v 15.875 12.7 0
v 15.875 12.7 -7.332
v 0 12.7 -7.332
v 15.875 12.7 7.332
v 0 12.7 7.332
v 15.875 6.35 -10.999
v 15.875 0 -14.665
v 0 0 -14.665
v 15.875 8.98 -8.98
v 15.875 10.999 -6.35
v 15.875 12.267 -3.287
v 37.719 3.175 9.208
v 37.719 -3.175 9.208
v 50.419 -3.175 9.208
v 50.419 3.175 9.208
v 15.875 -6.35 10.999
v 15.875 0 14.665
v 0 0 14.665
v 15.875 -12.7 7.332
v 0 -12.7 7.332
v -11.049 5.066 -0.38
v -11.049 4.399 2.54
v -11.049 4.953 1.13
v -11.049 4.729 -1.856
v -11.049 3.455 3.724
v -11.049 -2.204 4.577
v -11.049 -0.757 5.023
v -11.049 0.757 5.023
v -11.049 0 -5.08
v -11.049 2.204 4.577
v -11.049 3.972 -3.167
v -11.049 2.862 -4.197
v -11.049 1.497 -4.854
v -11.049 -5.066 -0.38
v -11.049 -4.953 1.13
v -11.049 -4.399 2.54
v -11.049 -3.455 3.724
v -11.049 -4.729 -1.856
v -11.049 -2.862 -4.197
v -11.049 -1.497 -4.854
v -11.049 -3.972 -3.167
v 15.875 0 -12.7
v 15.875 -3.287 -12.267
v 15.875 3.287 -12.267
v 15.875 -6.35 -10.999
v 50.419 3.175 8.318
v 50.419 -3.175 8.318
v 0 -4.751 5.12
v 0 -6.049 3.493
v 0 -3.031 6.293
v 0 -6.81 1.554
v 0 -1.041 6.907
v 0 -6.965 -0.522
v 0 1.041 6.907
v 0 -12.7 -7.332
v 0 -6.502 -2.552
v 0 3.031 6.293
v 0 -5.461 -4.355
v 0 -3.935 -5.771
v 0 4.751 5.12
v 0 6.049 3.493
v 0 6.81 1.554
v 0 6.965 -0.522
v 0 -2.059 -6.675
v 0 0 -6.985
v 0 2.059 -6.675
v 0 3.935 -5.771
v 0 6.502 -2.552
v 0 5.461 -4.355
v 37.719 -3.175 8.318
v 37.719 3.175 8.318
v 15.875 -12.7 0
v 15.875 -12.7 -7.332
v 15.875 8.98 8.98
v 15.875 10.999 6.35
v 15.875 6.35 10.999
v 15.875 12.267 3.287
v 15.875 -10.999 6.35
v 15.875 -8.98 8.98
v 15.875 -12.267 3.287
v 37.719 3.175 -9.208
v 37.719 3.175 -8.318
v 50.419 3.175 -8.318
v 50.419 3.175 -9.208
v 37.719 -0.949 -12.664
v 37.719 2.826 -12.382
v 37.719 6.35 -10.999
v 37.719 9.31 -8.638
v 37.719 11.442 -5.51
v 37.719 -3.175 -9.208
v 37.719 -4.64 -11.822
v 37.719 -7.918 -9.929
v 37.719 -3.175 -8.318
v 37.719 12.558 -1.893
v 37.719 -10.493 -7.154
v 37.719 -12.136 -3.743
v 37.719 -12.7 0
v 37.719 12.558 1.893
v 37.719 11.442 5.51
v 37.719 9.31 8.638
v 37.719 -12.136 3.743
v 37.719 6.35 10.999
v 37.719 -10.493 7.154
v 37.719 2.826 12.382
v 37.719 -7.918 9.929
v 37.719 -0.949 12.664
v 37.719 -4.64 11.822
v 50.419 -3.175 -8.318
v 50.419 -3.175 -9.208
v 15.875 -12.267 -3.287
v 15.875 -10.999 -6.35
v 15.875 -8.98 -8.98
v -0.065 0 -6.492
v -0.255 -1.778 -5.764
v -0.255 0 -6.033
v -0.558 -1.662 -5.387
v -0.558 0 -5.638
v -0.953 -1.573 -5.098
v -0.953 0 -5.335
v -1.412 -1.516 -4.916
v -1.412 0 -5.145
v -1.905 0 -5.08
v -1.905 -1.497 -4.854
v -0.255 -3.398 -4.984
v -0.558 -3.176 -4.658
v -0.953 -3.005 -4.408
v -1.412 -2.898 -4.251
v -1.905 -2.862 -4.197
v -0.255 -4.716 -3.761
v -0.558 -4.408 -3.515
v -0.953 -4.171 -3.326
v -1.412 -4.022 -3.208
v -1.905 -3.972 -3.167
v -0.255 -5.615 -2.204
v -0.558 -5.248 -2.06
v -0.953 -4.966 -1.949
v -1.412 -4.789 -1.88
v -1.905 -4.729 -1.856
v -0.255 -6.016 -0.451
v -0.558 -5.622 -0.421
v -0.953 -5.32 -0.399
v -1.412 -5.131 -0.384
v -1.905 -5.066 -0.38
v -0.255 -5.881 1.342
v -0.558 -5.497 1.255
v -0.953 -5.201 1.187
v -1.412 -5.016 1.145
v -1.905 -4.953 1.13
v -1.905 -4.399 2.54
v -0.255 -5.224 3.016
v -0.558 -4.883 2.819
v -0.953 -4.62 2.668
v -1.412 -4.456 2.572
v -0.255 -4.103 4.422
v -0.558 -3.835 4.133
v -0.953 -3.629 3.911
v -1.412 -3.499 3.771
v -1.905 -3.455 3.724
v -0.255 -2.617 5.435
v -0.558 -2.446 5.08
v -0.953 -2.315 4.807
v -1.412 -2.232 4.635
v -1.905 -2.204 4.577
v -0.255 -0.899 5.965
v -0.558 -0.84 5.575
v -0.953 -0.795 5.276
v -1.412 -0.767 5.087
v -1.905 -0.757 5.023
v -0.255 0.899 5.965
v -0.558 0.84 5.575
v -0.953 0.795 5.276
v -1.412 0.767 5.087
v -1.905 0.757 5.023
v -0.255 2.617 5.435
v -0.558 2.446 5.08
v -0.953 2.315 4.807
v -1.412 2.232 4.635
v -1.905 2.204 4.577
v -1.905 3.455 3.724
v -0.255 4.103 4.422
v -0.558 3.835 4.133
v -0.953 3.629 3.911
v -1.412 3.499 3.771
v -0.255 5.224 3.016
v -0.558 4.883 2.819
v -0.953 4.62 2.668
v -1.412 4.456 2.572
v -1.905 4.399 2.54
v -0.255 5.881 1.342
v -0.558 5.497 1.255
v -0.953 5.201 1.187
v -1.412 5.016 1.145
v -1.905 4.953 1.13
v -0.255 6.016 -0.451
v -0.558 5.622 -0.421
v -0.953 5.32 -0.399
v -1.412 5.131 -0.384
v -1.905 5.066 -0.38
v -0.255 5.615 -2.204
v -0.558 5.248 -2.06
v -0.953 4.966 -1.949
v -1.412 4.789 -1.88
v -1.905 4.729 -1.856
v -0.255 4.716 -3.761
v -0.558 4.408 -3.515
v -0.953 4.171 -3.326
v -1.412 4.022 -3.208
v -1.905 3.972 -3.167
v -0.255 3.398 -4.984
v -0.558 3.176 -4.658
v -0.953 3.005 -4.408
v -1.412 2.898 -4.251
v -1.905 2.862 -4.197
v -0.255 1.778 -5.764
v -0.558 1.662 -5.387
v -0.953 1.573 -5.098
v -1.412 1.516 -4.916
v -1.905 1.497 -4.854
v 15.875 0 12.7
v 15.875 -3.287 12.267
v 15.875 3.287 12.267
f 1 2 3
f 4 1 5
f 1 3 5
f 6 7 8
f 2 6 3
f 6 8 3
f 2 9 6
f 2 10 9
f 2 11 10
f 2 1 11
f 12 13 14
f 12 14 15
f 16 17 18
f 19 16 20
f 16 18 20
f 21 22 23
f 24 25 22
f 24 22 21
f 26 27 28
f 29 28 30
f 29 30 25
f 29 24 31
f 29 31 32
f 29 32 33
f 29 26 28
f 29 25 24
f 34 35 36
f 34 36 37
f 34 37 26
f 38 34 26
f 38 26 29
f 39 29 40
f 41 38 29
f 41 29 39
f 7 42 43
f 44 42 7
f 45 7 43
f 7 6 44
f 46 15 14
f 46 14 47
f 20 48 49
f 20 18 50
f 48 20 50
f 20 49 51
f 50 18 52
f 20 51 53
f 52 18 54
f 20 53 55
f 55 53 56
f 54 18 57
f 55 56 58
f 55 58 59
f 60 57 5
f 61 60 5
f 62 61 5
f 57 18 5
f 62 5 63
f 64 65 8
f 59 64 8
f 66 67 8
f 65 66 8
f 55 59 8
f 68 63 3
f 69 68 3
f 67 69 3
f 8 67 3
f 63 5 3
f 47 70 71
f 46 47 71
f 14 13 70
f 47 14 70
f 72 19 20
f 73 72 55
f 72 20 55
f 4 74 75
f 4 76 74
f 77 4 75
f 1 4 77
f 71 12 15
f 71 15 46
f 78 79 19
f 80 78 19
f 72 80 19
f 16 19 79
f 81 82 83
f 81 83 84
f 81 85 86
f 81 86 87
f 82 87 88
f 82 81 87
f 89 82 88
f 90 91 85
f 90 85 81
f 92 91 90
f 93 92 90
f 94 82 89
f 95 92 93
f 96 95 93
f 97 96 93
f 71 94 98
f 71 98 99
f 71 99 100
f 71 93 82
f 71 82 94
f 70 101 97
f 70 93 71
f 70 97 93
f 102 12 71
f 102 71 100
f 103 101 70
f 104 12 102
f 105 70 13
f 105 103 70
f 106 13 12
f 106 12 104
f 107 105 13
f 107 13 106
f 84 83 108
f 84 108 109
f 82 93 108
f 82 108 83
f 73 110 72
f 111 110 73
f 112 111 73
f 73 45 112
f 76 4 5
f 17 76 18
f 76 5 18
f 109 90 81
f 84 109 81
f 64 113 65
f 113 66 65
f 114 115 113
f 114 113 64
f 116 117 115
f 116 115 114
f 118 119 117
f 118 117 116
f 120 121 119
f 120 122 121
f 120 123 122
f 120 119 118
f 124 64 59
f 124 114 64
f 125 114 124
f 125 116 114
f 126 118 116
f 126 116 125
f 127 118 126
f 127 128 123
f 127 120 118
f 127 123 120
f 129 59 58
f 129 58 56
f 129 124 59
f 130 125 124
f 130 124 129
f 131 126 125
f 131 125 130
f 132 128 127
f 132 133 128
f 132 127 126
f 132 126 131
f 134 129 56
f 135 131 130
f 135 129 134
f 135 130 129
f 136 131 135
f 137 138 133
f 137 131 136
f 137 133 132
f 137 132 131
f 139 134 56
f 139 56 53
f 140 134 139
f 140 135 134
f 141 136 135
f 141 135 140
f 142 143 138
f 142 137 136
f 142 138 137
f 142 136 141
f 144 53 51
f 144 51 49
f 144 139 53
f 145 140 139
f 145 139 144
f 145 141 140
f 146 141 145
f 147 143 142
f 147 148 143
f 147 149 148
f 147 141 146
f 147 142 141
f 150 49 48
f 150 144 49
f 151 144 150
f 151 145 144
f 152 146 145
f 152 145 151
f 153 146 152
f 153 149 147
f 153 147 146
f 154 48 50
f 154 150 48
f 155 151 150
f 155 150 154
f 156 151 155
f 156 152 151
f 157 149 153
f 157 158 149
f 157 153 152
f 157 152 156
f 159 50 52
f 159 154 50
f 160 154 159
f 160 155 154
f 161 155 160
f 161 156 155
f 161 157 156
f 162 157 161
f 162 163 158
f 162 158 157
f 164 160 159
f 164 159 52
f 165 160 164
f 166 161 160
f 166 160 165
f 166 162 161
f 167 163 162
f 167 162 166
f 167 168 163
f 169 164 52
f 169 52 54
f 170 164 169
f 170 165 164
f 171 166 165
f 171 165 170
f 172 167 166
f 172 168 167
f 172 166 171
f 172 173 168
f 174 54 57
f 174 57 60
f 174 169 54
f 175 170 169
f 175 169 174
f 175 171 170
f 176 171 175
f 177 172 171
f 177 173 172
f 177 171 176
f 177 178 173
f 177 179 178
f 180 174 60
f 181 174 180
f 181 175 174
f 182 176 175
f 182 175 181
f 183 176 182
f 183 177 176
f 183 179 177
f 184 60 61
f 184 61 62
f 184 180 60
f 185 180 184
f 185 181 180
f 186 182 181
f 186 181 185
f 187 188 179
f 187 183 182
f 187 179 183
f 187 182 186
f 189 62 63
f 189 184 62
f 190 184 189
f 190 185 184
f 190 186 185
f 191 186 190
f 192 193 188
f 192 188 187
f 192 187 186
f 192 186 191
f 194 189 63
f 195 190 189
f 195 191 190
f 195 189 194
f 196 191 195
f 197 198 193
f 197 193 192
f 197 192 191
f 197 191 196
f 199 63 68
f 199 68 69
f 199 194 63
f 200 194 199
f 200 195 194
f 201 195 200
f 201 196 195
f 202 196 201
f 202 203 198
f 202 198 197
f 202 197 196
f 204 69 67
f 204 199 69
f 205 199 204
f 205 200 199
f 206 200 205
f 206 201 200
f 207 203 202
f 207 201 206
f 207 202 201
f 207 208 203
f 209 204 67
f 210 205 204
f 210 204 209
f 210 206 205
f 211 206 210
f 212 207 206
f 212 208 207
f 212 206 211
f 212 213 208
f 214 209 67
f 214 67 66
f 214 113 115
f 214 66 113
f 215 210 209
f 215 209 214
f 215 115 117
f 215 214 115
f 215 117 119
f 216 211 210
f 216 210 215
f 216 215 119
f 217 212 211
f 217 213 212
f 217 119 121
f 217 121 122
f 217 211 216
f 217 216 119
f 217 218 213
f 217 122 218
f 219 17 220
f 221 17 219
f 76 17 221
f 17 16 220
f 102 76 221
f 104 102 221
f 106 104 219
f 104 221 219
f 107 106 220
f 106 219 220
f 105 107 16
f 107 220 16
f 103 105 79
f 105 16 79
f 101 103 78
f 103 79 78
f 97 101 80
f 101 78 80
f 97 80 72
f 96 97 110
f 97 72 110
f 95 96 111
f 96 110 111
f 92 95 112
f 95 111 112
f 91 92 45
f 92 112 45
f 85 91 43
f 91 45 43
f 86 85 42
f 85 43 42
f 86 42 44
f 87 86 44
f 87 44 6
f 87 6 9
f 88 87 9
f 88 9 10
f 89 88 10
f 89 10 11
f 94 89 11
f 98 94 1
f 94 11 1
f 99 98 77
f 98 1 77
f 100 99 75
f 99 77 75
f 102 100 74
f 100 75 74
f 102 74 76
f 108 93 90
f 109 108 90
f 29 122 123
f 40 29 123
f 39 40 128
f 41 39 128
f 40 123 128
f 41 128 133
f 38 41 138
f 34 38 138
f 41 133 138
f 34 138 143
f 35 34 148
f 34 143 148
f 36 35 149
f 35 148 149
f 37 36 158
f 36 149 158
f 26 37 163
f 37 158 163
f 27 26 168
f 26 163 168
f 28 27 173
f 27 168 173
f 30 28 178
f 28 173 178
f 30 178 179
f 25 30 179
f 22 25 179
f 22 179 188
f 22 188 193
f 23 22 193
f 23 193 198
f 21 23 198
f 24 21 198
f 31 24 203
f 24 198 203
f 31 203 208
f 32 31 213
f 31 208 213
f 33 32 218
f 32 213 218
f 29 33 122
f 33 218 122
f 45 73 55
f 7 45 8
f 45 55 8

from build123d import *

# Parameters (mm, degrees)
BOSS_EXTRUDE1_DEPTH = 15.875
SKETCH2_R           = 12.7
BOSS_EXTRUDE2_DEPTH = 21.844
SKETCH3_R           = 5.08
BOSS_EXTRUDE3_DEPTH = 11.049
FILLET1_R           = 1.905
SKETCH4_W           = 0.889
SKETCH4_H           = 6.35
BOSS_EXTRUDE4_DEPTH = 12.7


with BuildPart() as part:
    # Sketch1 → Boss-Extrude1 (new body)
    with BuildSketch(Plane(origin=(0, 0, 0), x_dir=(0, 0, -1), z_dir=(1, 0, 0))):
        Polygon((14.664696837, 0), (7.332348419, 12.7), (-7.332348419, 12.7), (-14.664696837, 0), (-7.332348419, -12.7), (7.332348419, -12.7), align=None)
    extrude(amount=BOSS_EXTRUDE1_DEPTH)

    # Sketch2 → Boss-Extrude2 (add)
    with BuildSketch(Plane(origin=(15.875, 0, 0), x_dir=(0, 0, -1), z_dir=(1, 0, 0))):
        with Locations(Location((0, 0, 0), (0, 0, 150))):
            Circle(SKETCH2_R)
    extrude(amount=BOSS_EXTRUDE2_DEPTH)

    # Sketch3 → Boss-Extrude3 (add)
    with BuildSketch(Plane.ZY):
        with Locations(Location((0, 0, 0), (0, 0, 180))):
            Circle(SKETCH3_R)
    extrude(amount=BOSS_EXTRUDE3_DEPTH)

    # Fillet1
    fillet1_edges = [part.edges().sort_by_distance(p)[0] for p in [
        (0, 0, 5.08),
    ]]
    fillet(fillet1_edges, radius=FILLET1_R)

    # Sketch4 → Boss-Extrude4 (add)
    with BuildSketch(Plane(origin=(37.719, 0, 0), x_dir=(0, 0, -1), z_dir=(1, 0, 0))):
        with Locations((-8.763, 0)):
            Rectangle(SKETCH4_W, SKETCH4_H)
        with Locations((8.763, 0)):
            Rectangle(SKETCH4_W, SKETCH4_H)
    extrude(amount=BOSS_EXTRUDE4_DEPTH)


solid = part.part
